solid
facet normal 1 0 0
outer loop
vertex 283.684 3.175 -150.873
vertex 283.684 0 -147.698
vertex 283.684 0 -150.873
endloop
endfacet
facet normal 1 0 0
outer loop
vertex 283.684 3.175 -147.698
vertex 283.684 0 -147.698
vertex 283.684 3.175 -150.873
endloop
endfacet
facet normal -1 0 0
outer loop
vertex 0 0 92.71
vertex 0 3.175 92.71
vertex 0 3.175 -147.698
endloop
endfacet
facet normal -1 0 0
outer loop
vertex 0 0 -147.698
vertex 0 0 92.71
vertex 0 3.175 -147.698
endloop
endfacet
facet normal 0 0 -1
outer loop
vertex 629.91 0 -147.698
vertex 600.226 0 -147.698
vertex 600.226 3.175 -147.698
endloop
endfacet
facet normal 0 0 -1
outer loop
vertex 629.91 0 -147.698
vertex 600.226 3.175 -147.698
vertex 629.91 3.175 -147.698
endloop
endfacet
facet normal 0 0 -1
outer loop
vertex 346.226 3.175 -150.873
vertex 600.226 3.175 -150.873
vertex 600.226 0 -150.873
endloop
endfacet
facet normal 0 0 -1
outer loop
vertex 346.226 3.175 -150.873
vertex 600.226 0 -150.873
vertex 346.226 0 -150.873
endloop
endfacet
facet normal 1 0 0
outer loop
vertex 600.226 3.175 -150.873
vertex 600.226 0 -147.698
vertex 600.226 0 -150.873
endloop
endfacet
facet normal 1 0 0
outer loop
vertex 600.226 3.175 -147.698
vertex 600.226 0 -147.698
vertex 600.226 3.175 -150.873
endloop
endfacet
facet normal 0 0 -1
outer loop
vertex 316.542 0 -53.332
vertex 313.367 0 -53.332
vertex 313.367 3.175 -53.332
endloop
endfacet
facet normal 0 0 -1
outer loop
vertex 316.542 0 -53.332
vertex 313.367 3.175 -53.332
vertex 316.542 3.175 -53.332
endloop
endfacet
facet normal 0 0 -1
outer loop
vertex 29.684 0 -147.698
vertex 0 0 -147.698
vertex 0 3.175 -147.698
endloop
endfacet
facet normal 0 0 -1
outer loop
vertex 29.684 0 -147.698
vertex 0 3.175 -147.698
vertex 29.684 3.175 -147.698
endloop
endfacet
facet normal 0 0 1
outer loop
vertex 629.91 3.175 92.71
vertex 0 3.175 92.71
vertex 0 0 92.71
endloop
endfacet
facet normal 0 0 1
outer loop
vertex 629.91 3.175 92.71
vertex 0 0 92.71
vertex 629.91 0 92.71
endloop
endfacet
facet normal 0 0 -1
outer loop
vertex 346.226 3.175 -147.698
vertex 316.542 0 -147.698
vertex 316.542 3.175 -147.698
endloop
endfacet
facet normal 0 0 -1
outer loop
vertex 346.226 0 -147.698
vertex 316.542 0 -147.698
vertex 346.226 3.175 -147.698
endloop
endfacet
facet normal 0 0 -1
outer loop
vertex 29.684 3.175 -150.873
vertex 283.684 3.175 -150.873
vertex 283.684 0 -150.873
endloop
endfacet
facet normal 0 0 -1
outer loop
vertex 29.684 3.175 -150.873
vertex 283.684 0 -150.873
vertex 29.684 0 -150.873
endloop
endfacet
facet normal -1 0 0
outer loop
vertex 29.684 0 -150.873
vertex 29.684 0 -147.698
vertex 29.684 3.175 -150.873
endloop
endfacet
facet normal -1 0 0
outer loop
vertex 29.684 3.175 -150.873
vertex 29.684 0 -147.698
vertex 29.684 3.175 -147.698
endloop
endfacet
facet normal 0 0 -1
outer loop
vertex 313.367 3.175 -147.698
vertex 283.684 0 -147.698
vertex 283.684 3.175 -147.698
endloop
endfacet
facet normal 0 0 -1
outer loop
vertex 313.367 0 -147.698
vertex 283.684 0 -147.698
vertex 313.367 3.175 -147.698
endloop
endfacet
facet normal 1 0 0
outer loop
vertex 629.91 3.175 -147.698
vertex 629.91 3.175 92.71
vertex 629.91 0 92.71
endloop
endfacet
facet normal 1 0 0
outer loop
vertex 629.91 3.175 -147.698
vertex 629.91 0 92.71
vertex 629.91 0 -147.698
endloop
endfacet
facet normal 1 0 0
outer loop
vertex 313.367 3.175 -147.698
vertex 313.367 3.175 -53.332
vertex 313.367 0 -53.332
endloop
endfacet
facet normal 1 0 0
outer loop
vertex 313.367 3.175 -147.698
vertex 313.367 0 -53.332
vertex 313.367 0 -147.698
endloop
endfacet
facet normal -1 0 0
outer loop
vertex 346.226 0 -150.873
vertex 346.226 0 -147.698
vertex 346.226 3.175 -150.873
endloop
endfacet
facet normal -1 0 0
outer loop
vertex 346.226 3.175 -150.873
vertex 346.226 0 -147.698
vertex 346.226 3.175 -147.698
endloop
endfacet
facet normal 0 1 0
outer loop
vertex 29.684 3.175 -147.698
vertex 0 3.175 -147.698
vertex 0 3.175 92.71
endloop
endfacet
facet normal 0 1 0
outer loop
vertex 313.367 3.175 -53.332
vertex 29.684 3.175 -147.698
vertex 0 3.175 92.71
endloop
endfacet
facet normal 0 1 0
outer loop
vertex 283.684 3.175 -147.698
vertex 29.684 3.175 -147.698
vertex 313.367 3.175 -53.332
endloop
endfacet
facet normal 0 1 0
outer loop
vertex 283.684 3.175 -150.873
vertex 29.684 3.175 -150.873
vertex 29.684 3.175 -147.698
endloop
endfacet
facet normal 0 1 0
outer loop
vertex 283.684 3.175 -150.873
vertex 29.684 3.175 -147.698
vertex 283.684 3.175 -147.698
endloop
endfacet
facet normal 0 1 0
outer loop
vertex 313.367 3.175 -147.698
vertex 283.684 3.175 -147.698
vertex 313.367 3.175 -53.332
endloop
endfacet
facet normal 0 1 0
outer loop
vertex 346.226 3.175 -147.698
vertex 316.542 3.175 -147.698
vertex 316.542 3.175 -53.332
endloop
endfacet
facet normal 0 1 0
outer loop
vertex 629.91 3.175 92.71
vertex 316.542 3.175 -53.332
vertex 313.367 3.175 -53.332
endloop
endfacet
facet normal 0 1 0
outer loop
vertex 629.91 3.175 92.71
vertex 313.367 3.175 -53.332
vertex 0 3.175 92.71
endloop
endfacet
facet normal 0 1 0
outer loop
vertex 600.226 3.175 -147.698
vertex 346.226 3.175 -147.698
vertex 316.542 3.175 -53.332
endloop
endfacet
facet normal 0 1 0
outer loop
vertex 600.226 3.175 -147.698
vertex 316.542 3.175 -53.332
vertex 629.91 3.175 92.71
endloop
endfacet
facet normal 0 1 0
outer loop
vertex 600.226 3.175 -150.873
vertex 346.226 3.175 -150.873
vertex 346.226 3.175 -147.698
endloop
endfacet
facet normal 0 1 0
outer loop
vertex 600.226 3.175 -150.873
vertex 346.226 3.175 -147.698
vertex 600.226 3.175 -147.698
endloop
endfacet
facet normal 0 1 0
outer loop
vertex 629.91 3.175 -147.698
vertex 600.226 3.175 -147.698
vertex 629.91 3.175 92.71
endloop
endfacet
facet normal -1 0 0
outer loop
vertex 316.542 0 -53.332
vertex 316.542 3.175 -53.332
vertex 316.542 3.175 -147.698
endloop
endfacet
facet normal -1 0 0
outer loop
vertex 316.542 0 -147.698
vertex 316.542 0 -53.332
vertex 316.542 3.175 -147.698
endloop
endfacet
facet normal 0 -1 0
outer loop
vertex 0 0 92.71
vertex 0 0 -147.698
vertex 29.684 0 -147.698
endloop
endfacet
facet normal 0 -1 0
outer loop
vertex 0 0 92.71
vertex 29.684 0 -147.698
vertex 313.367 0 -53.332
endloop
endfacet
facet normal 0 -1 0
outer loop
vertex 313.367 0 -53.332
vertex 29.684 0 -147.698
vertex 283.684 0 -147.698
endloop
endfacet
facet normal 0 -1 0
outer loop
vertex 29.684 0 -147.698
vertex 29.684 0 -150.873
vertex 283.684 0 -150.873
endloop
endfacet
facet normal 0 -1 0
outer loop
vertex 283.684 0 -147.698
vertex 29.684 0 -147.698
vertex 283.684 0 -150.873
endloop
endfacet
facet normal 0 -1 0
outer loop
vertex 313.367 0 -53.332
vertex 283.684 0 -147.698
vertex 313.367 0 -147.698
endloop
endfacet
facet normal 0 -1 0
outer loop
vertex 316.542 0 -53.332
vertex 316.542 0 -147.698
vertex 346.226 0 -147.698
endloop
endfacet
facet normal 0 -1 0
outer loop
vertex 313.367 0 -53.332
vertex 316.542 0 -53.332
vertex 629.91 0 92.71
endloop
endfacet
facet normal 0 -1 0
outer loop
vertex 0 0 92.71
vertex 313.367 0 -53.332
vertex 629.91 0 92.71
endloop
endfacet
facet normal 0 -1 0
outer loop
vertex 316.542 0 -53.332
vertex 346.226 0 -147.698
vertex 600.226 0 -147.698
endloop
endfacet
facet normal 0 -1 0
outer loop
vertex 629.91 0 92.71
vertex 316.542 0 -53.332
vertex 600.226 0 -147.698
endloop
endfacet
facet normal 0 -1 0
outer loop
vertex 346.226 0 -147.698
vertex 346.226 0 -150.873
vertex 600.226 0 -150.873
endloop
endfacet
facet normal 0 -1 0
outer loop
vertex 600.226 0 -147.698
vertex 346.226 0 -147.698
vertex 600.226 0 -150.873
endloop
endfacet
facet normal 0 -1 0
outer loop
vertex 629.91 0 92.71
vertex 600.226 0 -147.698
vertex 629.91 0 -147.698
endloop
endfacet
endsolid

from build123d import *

# Parameters (mm, degrees)
SKETCH1_W           = 629.90984
SKETCH1_H           = 147.69846
BOSS_EXTRUDE1_DEPTH = 3.175
SKETCH3_W           = 254
SKETCH3_H           = 3.175
BOSS_EXTRUDE2_DEPTH = 3.175
SKETCH4_W           = 3.175
SKETCH4_H           = 188.732840052
CUT_EXTRUDE1_DEPTH  = 3.175
SKETCH7_W           = 629.90984
SKETCH7_H           = 92.71
BOSS_EXTRUDE3_DEPTH = 3.175


with BuildPart() as part:
    # Sketch1 → Boss-Extrude1 (new body)
    with BuildSketch(Plane(origin=(0, 0, 0), x_dir=(1, 0, 0), z_dir=(0, 1, 0))):
        with Locations((314.95492, 73.84923)):
            Rectangle(SKETCH1_W, SKETCH1_H)
    extrude(amount=BOSS_EXTRUDE1_DEPTH)

    # Sketch3 → Boss-Extrude2 (add)
    with BuildSketch(Plane(origin=(0, 0, -147.69846), x_dir=(-1, 0, 0), z_dir=(0, 0, -1))):
        with Locations((-473.22613, 1.5875)):
            Rectangle(SKETCH3_W, SKETCH3_H)
        with Locations((-156.68371, 1.5875)):
            Rectangle(SKETCH3_W, SKETCH3_H)
    extrude(amount=BOSS_EXTRUDE2_DEPTH)

    # Sketch4 → Cut-Extrude1 (cut)
    with BuildSketch(Plane(origin=(0, 3.175, 0), x_dir=(1, 0, 0), z_dir=(0, 1, 0))):
        with Locations((314.95492, 147.69846)):
            Rectangle(SKETCH4_W, SKETCH4_H)
    extrude(amount=-CUT_EXTRUDE1_DEPTH, mode=Mode.SUBTRACT)

    # Sketch7 → Boss-Extrude3 (add, through all)
    with BuildSketch(Plane(origin=(0, 3.175, 0), x_dir=(1, 0, 0), z_dir=(0, 1, 0))):
        with Locations((314.95492, -46.355)):
            Rectangle(SKETCH7_W, SKETCH7_H)
    extrude(amount=-BOSS_EXTRUDE3_DEPTH)


solid = part.part
